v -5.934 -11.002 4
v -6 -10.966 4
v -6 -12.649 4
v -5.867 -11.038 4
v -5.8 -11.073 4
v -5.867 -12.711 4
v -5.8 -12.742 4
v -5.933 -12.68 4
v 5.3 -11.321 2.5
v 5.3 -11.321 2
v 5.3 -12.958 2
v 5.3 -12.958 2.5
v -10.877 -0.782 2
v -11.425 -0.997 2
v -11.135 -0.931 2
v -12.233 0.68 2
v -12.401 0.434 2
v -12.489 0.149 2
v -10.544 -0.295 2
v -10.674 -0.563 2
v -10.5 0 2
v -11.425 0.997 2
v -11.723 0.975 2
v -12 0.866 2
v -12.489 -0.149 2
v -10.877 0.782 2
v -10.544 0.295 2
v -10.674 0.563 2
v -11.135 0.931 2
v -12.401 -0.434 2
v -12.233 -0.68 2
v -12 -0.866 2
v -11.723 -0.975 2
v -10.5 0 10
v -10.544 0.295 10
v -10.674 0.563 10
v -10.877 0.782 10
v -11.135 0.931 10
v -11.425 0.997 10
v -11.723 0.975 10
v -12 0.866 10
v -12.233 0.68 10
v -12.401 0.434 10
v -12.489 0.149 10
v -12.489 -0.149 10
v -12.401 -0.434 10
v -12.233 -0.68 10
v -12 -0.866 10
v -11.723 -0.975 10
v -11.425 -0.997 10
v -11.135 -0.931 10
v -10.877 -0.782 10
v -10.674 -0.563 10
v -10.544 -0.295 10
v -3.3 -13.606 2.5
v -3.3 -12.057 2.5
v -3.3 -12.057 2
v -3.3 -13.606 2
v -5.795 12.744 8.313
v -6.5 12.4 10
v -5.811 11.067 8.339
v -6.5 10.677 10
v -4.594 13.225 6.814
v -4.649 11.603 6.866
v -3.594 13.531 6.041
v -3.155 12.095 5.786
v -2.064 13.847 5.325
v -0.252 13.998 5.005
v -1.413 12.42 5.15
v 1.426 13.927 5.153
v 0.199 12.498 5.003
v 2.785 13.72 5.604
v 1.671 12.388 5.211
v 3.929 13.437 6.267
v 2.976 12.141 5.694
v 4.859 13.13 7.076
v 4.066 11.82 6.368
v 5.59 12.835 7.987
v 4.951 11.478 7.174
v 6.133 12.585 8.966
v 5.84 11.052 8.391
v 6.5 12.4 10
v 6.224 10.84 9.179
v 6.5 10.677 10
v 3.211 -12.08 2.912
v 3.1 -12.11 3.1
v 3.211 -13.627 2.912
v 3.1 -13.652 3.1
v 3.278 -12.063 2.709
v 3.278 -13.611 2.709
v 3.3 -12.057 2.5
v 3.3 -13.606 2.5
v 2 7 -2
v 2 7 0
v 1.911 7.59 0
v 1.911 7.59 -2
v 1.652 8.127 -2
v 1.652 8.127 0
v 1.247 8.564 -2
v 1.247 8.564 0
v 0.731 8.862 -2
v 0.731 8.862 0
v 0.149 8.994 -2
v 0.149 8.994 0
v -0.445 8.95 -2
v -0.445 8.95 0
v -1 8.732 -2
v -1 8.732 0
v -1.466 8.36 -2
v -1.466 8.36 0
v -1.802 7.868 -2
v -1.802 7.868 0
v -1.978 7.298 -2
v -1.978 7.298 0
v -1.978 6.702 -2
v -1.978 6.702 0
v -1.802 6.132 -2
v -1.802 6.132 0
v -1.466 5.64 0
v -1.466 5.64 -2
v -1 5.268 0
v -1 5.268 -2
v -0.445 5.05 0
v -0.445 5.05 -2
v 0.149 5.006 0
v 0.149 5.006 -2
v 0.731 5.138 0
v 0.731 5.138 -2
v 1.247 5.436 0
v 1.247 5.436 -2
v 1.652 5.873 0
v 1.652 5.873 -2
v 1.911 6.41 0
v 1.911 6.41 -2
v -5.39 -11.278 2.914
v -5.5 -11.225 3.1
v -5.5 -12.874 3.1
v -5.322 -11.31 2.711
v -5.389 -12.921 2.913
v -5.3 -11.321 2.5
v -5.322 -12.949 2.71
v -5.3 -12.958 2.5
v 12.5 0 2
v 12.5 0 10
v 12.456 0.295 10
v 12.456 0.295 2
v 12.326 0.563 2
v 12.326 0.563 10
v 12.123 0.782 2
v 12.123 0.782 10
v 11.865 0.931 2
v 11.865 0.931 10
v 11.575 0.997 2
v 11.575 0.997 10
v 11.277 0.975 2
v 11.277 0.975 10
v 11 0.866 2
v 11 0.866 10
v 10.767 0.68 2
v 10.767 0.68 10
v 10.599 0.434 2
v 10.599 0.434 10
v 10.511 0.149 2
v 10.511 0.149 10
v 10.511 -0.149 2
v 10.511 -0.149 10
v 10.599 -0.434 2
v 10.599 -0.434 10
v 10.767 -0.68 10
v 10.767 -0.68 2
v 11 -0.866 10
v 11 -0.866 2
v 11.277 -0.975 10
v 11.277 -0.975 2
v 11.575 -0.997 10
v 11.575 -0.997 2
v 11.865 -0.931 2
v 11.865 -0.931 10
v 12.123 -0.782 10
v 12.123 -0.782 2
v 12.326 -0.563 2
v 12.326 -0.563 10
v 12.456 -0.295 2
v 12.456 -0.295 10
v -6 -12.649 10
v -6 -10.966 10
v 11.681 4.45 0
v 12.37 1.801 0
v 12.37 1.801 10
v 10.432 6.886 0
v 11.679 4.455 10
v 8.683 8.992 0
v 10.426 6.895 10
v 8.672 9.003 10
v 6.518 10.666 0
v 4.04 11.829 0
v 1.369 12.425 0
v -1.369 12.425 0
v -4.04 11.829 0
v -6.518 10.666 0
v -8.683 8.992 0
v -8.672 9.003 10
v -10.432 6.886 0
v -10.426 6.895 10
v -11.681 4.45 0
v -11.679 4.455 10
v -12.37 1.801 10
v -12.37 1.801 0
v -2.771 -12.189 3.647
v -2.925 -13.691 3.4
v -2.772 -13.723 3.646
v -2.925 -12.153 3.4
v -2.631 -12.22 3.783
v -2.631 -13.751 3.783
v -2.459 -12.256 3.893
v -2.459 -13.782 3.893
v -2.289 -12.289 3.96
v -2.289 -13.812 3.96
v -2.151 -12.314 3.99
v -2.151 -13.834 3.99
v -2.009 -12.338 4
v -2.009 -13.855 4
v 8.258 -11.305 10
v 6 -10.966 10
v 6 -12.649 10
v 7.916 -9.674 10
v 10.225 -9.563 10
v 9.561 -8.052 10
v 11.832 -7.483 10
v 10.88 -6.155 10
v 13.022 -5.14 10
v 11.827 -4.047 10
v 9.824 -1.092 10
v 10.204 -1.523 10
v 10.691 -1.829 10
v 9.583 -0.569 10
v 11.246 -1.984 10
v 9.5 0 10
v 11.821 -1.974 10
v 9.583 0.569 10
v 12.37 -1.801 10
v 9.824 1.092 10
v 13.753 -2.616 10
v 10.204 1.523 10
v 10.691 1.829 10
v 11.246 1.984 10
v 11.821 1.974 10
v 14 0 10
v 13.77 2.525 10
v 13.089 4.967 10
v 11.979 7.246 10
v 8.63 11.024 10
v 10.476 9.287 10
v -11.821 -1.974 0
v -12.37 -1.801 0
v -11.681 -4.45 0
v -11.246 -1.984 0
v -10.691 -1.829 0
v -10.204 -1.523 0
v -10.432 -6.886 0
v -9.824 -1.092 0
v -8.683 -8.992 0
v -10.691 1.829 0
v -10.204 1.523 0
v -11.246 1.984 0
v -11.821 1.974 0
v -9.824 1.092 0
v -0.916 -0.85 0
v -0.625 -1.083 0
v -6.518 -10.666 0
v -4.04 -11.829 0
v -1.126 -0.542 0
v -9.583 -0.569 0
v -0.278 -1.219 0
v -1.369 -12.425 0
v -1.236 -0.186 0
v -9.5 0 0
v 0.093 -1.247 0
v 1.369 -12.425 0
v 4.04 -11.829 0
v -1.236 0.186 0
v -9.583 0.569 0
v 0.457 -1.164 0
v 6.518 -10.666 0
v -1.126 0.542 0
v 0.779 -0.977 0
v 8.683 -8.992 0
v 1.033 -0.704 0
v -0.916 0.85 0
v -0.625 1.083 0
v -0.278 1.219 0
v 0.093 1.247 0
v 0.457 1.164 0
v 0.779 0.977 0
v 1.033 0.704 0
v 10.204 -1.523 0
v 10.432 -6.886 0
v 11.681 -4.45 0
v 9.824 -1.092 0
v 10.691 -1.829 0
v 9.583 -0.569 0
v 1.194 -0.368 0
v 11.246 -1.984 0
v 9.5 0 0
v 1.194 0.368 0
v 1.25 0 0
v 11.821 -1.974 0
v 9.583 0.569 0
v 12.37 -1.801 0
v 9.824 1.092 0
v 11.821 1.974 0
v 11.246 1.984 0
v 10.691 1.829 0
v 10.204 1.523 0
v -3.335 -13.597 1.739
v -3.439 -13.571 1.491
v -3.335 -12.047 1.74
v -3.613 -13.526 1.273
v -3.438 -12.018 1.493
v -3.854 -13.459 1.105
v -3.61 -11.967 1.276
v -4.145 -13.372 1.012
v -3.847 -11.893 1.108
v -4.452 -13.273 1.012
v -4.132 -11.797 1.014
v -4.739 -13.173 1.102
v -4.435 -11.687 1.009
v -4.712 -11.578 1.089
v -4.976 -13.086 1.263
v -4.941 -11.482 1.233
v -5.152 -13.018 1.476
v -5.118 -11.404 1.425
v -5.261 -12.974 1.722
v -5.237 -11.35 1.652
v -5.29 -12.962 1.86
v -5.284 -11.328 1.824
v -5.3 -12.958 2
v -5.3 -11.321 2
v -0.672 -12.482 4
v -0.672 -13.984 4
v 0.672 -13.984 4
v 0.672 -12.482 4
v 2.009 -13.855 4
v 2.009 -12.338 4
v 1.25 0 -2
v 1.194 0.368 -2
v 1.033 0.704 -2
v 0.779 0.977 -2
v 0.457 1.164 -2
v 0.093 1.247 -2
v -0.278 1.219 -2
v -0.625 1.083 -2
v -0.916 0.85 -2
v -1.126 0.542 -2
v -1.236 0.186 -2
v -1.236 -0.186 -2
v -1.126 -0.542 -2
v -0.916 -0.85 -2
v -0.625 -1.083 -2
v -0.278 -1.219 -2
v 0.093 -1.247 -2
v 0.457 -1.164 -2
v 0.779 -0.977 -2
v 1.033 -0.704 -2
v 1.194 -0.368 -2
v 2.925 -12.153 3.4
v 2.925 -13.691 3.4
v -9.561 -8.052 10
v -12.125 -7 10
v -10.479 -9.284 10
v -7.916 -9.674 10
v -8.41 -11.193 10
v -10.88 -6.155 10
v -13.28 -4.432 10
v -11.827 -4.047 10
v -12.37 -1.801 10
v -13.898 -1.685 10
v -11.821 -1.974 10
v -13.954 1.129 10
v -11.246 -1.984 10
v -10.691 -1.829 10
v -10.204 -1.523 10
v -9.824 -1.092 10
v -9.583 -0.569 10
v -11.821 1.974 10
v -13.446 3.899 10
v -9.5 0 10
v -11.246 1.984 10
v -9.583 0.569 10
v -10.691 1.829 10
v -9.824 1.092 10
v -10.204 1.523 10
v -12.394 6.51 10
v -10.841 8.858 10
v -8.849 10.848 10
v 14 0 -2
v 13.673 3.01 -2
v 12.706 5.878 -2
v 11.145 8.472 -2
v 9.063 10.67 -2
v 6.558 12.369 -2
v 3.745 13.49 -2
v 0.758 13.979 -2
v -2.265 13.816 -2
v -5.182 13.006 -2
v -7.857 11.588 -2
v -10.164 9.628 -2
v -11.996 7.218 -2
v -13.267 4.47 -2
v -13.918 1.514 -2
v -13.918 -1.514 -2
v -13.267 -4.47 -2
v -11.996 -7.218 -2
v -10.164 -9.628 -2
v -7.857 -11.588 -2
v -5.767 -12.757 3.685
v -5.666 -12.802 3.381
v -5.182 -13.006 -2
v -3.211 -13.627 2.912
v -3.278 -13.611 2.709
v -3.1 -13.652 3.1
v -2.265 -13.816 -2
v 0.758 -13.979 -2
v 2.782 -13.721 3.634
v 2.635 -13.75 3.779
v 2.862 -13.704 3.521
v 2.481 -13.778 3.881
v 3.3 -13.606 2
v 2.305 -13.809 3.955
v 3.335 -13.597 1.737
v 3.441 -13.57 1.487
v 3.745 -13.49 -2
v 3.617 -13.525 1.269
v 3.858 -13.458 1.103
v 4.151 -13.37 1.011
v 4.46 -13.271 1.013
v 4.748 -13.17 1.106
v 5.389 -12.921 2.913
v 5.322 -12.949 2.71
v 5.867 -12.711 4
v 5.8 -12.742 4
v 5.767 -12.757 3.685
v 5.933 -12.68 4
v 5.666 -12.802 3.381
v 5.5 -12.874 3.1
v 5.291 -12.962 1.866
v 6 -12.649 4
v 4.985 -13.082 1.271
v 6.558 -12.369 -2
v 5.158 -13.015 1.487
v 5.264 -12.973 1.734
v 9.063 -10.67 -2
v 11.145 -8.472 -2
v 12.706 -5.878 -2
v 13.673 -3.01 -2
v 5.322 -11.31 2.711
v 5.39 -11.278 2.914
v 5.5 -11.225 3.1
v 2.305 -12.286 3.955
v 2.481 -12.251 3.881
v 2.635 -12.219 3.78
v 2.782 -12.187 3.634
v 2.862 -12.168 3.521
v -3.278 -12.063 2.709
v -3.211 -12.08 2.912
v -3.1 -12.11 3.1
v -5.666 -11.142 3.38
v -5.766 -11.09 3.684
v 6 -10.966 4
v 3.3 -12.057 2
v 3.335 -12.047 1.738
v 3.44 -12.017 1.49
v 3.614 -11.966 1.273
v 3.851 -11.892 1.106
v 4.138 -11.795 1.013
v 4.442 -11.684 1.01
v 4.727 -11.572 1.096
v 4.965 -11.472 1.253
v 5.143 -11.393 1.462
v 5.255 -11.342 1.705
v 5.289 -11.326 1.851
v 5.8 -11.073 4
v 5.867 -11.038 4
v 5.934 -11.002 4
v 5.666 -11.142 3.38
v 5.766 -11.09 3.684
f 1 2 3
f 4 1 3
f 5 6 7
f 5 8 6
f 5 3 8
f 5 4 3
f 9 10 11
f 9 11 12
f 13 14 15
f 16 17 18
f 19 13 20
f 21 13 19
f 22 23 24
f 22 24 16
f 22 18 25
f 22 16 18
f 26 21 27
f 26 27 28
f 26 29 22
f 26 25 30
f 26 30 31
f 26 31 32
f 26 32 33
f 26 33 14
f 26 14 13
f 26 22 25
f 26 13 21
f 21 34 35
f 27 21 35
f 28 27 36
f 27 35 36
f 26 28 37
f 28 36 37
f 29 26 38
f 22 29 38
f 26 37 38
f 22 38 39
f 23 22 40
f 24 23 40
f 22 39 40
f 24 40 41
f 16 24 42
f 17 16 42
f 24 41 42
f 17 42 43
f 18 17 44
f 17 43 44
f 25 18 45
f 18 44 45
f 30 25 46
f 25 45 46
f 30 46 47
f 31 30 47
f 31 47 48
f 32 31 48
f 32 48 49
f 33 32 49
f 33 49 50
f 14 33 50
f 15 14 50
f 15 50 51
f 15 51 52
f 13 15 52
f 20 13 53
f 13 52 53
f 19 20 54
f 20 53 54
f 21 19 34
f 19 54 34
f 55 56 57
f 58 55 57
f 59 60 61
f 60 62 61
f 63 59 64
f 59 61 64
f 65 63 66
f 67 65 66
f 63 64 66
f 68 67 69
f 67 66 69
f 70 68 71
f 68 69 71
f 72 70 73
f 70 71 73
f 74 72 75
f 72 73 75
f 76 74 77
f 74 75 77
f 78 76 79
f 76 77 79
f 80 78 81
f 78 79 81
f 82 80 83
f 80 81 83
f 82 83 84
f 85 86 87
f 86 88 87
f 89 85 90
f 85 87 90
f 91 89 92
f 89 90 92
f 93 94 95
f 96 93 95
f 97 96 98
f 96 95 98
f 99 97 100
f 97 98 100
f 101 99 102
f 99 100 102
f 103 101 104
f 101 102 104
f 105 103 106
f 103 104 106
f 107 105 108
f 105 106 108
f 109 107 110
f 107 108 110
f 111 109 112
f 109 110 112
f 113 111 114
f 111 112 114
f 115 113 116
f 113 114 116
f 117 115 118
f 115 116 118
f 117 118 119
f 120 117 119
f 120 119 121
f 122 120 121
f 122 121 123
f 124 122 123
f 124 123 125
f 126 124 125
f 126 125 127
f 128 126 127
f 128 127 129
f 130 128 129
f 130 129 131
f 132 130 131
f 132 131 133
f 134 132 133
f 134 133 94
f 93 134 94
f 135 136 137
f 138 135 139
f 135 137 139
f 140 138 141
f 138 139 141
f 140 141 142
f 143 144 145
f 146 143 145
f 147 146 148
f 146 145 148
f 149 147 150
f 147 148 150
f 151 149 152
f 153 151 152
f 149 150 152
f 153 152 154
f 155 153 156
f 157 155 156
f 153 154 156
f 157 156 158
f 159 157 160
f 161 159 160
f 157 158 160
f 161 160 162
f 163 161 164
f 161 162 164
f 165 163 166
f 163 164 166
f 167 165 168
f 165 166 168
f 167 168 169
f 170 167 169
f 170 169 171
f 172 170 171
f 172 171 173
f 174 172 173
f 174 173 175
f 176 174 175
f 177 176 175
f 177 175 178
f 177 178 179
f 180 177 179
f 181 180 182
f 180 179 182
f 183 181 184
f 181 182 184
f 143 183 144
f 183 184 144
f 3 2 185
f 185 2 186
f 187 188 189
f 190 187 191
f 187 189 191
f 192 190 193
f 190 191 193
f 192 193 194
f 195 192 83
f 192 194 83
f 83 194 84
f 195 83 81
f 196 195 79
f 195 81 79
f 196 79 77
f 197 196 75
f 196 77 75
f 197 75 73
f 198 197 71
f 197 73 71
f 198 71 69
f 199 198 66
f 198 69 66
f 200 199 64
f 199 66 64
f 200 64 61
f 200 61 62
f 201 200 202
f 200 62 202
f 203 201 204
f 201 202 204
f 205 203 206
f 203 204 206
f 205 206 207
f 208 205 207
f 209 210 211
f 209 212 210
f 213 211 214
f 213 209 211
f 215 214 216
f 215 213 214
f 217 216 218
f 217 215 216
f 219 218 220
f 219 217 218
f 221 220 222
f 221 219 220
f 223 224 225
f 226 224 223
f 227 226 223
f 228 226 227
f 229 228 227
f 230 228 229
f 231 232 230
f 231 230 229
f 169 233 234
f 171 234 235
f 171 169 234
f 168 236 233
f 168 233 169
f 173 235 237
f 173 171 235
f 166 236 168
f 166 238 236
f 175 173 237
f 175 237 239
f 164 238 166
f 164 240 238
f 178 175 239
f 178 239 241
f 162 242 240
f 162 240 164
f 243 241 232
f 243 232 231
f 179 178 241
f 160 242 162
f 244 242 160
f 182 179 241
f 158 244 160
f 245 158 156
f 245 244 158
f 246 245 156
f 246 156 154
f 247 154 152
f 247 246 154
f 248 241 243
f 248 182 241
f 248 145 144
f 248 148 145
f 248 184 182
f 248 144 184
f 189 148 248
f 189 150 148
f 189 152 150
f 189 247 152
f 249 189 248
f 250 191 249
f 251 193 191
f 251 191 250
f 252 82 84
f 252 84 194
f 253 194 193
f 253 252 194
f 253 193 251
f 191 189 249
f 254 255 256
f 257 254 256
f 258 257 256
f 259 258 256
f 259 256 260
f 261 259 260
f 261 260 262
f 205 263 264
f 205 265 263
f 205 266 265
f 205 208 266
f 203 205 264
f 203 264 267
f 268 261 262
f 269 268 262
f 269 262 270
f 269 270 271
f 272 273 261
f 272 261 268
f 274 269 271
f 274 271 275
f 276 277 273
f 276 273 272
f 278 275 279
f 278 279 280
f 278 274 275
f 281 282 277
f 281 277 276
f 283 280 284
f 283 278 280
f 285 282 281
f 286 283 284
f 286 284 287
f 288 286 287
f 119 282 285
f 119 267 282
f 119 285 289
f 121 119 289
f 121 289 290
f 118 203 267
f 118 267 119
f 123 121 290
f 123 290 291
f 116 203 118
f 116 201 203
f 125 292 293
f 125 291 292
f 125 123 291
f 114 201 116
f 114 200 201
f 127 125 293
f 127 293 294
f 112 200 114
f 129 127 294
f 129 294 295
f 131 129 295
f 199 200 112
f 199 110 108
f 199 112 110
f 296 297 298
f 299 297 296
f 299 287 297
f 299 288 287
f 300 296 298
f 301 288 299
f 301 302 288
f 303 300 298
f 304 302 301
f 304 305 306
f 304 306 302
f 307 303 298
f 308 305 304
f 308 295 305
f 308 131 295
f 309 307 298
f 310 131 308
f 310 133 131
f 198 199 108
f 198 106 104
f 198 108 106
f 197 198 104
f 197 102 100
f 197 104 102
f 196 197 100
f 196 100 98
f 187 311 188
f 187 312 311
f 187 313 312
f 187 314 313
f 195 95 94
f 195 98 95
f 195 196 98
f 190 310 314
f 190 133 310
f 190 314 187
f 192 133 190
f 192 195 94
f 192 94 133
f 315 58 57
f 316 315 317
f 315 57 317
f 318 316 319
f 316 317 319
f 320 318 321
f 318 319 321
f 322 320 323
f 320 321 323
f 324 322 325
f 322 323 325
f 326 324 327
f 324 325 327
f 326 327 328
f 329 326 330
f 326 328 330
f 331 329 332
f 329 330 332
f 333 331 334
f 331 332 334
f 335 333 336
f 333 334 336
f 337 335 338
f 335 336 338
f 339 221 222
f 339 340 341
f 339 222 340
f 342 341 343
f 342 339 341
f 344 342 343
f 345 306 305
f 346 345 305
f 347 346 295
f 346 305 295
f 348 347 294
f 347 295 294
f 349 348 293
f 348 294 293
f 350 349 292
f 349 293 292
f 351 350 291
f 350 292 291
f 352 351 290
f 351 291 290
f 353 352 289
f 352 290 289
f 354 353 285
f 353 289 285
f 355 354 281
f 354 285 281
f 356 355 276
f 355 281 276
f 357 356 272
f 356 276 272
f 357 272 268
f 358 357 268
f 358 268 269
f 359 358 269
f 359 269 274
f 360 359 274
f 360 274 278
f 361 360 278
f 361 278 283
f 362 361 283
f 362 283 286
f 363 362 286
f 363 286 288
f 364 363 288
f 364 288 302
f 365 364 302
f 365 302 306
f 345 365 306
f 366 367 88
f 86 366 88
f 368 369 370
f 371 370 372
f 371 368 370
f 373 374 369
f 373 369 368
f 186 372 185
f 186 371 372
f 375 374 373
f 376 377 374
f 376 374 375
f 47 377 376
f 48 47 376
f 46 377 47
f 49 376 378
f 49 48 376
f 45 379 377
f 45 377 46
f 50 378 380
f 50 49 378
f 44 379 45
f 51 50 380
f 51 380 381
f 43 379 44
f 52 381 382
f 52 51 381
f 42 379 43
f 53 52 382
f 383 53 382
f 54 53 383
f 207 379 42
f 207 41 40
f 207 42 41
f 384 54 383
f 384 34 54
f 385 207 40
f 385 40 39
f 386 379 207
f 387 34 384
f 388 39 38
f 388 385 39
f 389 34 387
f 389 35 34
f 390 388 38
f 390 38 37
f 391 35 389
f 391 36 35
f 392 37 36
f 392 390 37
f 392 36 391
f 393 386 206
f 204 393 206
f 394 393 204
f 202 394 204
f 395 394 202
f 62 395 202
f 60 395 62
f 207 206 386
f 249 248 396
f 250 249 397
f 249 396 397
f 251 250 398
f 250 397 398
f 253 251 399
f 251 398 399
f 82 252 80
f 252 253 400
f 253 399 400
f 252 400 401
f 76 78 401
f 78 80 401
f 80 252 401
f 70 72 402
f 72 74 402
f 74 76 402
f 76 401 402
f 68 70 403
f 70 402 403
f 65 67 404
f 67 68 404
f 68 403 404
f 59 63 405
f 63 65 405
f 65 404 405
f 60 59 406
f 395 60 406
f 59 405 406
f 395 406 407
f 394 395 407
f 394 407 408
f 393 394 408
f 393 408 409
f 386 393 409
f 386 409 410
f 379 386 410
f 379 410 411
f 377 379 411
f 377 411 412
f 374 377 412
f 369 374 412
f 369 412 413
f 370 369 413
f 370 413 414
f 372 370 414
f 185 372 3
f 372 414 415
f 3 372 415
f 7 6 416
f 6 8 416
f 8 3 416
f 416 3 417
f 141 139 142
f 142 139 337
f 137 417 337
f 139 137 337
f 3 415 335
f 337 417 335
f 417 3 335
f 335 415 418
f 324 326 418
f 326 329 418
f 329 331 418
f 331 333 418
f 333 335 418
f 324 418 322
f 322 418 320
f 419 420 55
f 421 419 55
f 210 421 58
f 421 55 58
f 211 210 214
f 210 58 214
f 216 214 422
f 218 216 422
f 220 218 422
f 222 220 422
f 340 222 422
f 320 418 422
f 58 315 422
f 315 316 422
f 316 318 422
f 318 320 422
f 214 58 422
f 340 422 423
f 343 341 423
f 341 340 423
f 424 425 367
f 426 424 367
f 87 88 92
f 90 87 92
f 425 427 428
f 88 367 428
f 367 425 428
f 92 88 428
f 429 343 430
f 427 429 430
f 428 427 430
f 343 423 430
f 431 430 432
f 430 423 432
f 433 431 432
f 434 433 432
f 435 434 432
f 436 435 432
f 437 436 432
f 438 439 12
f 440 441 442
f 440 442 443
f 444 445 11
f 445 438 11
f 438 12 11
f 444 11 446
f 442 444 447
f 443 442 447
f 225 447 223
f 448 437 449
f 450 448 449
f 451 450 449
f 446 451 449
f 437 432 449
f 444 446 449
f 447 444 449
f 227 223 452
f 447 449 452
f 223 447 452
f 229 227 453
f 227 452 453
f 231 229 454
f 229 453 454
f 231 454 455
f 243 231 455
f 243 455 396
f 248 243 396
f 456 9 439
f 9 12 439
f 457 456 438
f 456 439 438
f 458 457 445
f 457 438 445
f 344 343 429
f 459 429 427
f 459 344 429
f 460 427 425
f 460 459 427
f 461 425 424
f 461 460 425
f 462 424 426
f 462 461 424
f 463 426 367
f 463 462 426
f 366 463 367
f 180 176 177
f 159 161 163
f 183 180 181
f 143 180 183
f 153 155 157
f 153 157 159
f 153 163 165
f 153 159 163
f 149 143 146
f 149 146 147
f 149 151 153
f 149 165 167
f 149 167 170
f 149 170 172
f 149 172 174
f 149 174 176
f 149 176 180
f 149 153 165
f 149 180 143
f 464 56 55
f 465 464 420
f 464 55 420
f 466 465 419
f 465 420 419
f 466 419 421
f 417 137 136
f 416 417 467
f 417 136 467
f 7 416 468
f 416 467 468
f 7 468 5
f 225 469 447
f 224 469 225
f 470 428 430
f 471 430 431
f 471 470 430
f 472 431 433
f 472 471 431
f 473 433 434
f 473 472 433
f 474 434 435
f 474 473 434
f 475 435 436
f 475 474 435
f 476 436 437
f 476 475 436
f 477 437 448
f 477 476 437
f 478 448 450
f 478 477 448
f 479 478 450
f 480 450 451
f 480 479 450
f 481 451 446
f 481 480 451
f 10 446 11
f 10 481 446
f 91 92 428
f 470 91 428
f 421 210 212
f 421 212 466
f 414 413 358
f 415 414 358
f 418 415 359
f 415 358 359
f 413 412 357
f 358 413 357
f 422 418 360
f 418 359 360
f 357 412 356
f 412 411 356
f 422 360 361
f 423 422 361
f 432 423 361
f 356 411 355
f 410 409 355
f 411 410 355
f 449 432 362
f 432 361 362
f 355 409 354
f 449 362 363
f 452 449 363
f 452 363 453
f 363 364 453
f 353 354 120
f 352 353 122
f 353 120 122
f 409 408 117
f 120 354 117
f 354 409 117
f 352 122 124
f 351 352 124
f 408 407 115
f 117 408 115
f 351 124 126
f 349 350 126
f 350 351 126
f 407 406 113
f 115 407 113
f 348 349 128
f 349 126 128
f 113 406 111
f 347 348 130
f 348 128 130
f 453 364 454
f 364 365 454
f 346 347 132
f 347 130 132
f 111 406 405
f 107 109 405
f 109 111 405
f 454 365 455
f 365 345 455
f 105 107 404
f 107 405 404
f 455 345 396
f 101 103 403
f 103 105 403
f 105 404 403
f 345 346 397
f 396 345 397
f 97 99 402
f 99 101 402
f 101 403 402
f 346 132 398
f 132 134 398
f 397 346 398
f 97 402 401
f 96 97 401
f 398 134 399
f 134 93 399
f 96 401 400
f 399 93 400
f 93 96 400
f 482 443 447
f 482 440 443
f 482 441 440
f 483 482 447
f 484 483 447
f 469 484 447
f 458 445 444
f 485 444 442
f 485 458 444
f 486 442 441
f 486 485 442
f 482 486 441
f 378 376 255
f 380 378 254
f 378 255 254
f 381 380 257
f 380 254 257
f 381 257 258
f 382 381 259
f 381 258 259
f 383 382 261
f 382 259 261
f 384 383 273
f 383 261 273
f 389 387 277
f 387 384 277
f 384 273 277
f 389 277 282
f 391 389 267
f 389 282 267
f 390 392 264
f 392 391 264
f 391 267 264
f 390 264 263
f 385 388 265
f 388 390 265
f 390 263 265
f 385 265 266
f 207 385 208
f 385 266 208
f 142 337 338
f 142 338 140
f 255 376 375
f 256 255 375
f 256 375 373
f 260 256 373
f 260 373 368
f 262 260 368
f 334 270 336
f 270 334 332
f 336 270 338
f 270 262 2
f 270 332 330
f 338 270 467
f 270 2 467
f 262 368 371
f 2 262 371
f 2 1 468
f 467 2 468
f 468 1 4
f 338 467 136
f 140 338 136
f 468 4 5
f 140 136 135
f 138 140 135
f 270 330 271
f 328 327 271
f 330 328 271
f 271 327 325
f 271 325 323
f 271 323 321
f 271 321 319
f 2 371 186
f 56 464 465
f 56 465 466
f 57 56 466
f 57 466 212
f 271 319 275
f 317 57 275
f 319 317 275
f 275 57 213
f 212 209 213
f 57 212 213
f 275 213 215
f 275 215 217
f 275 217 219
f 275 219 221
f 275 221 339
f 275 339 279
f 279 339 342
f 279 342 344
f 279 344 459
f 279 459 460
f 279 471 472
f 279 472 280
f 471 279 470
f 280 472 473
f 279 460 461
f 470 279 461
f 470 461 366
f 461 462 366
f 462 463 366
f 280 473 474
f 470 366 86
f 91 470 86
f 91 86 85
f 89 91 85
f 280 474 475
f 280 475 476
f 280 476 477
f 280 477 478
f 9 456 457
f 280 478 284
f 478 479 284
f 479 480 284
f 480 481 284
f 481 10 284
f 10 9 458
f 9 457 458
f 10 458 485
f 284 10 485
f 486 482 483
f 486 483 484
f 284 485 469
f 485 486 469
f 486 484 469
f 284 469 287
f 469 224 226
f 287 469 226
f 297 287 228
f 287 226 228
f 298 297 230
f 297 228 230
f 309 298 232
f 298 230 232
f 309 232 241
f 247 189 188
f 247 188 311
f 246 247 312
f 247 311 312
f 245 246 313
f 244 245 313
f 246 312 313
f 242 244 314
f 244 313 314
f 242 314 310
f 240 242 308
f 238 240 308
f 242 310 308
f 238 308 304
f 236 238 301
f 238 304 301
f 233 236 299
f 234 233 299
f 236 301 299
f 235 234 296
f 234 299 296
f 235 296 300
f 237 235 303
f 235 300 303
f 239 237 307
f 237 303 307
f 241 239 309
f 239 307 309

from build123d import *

# Parameters (mm, degrees)
SKETCH_R        = 14
PAD_DEPTH       = 12
SKETCH001_R     = 12.5
POCKET_DEPTH    = 10
SKETCH002_R     = 1.25
SKETCH002_R_2   = 2
POCKET001_DEPTH = 5
SKETCH003_R     = 2
PAD001_DEPTH    = 10
SKETCH004_R     = 1
POCKET002_DEPTH = 8
SKETCH005_R     = 6.725
POCKET003_DEPTH = 20
SKETCH006_W     = 12
SKETCH006_H     = 6
POCKET004_DEPTH = 20
POCKET005_DEPTH = 20
FILLET_R        = 1


with BuildPart() as part:
    # Sketch → Pad (new body)
    with BuildSketch(Plane.XY.offset(4)):
        Circle(SKETCH_R)
    extrude(amount=PAD_DEPTH)

    # Sketch001 (on Face3 of Pad) → Pocket (cut)
    with BuildSketch(Plane.XY.offset(16)):
        Circle(SKETCH001_R)
    extrude(amount=-POCKET_DEPTH, mode=Mode.SUBTRACT)

    # Sketch002 (on Face5 of Pocket) → Pocket001 (cut)
    with BuildSketch(Plane.XY.offset(6)):
        Circle(SKETCH002_R)
        with Locations((0, 7)):
            Circle(SKETCH002_R_2)
    extrude(amount=-POCKET001_DEPTH, mode=Mode.SUBTRACT)

    # Sketch003 (on Face7 of Pocket001) → Pad001 (join)
    with BuildSketch(Plane.XY.offset(6)):
        with Locations((-11.5, 0)):
            Circle(SKETCH003_R)
        with Locations((11.5, 0)):
            Circle(SKETCH003_R)
    extrude(amount=PAD001_DEPTH)

    # Sketch004 (on Face3 of Pad001) → Pocket002 (cut)
    with BuildSketch(Plane.XY.offset(16)):
        with Locations((-11.5, 0)):
            Circle(SKETCH004_R)
        with Locations((11.5, 0)):
            Circle(SKETCH004_R)
    extrude(amount=-POCKET002_DEPTH, mode=Mode.SUBTRACT)

    # Sketch005 → Pocket003 (cut)
    with BuildSketch(Plane.XZ):
        with Locations((0, 17.725)):
            Circle(SKETCH005_R)
    extrude(amount=-POCKET003_DEPTH, mode=Mode.SUBTRACT)

    # Sketch006 → Pocket004 (cut)
    with BuildSketch(Plane.XZ):
        with Locations((0, 13)):
            Rectangle(SKETCH006_W, SKETCH006_H)
    extrude(amount=POCKET004_DEPTH, mode=Mode.SUBTRACT)

    # Sketch007 → Pocket005 (cut)
    with BuildSketch(Plane.XZ):
        with BuildLine():
            ThreePointArc((5.3, 8.881966), (4.3, 11.5), (3.3, 8.881966))
            Line((3.3, 8.881966), (3.3, 8))
            ThreePointArc((3.3, 8), (4.3, 7), (5.3, 8))
            Line((5.3, 8), (5.3, 8.881966))
        make_face()
    pocket005 = extrude(amount=POCKET005_DEPTH, mode=Mode.SUBTRACT)

    # Mirrored: Pocket005 across Sketch007 V_Axis
    add(pocket005.mirror(Plane(origin=(0, 0, 0), x_dir=(0, -1, 0), z_dir=(1, 0, 0))), mode=Mode.SUBTRACT)

    # Fillet
    fillet_edges = [part.edges().sort_by_distance(p)[0] for p in [
        (3.3, -12.831024, 8.881966),
        (5.3, -12.139393, 8.881966),
        (-3.3, -12.831024, 8.881966),
        (-5.3, -12.139393, 8.881966),
        (-2.8, -12.949753, 10),
        (2.8, -12.949753, 10),
    ]]
    fillet(fillet_edges, radius=FILLET_R)


with BuildPart() as part_1:
    # Body placement: moved
    add(part.part.moved(Location((0, 0, -6))))


solid = part_1.part
